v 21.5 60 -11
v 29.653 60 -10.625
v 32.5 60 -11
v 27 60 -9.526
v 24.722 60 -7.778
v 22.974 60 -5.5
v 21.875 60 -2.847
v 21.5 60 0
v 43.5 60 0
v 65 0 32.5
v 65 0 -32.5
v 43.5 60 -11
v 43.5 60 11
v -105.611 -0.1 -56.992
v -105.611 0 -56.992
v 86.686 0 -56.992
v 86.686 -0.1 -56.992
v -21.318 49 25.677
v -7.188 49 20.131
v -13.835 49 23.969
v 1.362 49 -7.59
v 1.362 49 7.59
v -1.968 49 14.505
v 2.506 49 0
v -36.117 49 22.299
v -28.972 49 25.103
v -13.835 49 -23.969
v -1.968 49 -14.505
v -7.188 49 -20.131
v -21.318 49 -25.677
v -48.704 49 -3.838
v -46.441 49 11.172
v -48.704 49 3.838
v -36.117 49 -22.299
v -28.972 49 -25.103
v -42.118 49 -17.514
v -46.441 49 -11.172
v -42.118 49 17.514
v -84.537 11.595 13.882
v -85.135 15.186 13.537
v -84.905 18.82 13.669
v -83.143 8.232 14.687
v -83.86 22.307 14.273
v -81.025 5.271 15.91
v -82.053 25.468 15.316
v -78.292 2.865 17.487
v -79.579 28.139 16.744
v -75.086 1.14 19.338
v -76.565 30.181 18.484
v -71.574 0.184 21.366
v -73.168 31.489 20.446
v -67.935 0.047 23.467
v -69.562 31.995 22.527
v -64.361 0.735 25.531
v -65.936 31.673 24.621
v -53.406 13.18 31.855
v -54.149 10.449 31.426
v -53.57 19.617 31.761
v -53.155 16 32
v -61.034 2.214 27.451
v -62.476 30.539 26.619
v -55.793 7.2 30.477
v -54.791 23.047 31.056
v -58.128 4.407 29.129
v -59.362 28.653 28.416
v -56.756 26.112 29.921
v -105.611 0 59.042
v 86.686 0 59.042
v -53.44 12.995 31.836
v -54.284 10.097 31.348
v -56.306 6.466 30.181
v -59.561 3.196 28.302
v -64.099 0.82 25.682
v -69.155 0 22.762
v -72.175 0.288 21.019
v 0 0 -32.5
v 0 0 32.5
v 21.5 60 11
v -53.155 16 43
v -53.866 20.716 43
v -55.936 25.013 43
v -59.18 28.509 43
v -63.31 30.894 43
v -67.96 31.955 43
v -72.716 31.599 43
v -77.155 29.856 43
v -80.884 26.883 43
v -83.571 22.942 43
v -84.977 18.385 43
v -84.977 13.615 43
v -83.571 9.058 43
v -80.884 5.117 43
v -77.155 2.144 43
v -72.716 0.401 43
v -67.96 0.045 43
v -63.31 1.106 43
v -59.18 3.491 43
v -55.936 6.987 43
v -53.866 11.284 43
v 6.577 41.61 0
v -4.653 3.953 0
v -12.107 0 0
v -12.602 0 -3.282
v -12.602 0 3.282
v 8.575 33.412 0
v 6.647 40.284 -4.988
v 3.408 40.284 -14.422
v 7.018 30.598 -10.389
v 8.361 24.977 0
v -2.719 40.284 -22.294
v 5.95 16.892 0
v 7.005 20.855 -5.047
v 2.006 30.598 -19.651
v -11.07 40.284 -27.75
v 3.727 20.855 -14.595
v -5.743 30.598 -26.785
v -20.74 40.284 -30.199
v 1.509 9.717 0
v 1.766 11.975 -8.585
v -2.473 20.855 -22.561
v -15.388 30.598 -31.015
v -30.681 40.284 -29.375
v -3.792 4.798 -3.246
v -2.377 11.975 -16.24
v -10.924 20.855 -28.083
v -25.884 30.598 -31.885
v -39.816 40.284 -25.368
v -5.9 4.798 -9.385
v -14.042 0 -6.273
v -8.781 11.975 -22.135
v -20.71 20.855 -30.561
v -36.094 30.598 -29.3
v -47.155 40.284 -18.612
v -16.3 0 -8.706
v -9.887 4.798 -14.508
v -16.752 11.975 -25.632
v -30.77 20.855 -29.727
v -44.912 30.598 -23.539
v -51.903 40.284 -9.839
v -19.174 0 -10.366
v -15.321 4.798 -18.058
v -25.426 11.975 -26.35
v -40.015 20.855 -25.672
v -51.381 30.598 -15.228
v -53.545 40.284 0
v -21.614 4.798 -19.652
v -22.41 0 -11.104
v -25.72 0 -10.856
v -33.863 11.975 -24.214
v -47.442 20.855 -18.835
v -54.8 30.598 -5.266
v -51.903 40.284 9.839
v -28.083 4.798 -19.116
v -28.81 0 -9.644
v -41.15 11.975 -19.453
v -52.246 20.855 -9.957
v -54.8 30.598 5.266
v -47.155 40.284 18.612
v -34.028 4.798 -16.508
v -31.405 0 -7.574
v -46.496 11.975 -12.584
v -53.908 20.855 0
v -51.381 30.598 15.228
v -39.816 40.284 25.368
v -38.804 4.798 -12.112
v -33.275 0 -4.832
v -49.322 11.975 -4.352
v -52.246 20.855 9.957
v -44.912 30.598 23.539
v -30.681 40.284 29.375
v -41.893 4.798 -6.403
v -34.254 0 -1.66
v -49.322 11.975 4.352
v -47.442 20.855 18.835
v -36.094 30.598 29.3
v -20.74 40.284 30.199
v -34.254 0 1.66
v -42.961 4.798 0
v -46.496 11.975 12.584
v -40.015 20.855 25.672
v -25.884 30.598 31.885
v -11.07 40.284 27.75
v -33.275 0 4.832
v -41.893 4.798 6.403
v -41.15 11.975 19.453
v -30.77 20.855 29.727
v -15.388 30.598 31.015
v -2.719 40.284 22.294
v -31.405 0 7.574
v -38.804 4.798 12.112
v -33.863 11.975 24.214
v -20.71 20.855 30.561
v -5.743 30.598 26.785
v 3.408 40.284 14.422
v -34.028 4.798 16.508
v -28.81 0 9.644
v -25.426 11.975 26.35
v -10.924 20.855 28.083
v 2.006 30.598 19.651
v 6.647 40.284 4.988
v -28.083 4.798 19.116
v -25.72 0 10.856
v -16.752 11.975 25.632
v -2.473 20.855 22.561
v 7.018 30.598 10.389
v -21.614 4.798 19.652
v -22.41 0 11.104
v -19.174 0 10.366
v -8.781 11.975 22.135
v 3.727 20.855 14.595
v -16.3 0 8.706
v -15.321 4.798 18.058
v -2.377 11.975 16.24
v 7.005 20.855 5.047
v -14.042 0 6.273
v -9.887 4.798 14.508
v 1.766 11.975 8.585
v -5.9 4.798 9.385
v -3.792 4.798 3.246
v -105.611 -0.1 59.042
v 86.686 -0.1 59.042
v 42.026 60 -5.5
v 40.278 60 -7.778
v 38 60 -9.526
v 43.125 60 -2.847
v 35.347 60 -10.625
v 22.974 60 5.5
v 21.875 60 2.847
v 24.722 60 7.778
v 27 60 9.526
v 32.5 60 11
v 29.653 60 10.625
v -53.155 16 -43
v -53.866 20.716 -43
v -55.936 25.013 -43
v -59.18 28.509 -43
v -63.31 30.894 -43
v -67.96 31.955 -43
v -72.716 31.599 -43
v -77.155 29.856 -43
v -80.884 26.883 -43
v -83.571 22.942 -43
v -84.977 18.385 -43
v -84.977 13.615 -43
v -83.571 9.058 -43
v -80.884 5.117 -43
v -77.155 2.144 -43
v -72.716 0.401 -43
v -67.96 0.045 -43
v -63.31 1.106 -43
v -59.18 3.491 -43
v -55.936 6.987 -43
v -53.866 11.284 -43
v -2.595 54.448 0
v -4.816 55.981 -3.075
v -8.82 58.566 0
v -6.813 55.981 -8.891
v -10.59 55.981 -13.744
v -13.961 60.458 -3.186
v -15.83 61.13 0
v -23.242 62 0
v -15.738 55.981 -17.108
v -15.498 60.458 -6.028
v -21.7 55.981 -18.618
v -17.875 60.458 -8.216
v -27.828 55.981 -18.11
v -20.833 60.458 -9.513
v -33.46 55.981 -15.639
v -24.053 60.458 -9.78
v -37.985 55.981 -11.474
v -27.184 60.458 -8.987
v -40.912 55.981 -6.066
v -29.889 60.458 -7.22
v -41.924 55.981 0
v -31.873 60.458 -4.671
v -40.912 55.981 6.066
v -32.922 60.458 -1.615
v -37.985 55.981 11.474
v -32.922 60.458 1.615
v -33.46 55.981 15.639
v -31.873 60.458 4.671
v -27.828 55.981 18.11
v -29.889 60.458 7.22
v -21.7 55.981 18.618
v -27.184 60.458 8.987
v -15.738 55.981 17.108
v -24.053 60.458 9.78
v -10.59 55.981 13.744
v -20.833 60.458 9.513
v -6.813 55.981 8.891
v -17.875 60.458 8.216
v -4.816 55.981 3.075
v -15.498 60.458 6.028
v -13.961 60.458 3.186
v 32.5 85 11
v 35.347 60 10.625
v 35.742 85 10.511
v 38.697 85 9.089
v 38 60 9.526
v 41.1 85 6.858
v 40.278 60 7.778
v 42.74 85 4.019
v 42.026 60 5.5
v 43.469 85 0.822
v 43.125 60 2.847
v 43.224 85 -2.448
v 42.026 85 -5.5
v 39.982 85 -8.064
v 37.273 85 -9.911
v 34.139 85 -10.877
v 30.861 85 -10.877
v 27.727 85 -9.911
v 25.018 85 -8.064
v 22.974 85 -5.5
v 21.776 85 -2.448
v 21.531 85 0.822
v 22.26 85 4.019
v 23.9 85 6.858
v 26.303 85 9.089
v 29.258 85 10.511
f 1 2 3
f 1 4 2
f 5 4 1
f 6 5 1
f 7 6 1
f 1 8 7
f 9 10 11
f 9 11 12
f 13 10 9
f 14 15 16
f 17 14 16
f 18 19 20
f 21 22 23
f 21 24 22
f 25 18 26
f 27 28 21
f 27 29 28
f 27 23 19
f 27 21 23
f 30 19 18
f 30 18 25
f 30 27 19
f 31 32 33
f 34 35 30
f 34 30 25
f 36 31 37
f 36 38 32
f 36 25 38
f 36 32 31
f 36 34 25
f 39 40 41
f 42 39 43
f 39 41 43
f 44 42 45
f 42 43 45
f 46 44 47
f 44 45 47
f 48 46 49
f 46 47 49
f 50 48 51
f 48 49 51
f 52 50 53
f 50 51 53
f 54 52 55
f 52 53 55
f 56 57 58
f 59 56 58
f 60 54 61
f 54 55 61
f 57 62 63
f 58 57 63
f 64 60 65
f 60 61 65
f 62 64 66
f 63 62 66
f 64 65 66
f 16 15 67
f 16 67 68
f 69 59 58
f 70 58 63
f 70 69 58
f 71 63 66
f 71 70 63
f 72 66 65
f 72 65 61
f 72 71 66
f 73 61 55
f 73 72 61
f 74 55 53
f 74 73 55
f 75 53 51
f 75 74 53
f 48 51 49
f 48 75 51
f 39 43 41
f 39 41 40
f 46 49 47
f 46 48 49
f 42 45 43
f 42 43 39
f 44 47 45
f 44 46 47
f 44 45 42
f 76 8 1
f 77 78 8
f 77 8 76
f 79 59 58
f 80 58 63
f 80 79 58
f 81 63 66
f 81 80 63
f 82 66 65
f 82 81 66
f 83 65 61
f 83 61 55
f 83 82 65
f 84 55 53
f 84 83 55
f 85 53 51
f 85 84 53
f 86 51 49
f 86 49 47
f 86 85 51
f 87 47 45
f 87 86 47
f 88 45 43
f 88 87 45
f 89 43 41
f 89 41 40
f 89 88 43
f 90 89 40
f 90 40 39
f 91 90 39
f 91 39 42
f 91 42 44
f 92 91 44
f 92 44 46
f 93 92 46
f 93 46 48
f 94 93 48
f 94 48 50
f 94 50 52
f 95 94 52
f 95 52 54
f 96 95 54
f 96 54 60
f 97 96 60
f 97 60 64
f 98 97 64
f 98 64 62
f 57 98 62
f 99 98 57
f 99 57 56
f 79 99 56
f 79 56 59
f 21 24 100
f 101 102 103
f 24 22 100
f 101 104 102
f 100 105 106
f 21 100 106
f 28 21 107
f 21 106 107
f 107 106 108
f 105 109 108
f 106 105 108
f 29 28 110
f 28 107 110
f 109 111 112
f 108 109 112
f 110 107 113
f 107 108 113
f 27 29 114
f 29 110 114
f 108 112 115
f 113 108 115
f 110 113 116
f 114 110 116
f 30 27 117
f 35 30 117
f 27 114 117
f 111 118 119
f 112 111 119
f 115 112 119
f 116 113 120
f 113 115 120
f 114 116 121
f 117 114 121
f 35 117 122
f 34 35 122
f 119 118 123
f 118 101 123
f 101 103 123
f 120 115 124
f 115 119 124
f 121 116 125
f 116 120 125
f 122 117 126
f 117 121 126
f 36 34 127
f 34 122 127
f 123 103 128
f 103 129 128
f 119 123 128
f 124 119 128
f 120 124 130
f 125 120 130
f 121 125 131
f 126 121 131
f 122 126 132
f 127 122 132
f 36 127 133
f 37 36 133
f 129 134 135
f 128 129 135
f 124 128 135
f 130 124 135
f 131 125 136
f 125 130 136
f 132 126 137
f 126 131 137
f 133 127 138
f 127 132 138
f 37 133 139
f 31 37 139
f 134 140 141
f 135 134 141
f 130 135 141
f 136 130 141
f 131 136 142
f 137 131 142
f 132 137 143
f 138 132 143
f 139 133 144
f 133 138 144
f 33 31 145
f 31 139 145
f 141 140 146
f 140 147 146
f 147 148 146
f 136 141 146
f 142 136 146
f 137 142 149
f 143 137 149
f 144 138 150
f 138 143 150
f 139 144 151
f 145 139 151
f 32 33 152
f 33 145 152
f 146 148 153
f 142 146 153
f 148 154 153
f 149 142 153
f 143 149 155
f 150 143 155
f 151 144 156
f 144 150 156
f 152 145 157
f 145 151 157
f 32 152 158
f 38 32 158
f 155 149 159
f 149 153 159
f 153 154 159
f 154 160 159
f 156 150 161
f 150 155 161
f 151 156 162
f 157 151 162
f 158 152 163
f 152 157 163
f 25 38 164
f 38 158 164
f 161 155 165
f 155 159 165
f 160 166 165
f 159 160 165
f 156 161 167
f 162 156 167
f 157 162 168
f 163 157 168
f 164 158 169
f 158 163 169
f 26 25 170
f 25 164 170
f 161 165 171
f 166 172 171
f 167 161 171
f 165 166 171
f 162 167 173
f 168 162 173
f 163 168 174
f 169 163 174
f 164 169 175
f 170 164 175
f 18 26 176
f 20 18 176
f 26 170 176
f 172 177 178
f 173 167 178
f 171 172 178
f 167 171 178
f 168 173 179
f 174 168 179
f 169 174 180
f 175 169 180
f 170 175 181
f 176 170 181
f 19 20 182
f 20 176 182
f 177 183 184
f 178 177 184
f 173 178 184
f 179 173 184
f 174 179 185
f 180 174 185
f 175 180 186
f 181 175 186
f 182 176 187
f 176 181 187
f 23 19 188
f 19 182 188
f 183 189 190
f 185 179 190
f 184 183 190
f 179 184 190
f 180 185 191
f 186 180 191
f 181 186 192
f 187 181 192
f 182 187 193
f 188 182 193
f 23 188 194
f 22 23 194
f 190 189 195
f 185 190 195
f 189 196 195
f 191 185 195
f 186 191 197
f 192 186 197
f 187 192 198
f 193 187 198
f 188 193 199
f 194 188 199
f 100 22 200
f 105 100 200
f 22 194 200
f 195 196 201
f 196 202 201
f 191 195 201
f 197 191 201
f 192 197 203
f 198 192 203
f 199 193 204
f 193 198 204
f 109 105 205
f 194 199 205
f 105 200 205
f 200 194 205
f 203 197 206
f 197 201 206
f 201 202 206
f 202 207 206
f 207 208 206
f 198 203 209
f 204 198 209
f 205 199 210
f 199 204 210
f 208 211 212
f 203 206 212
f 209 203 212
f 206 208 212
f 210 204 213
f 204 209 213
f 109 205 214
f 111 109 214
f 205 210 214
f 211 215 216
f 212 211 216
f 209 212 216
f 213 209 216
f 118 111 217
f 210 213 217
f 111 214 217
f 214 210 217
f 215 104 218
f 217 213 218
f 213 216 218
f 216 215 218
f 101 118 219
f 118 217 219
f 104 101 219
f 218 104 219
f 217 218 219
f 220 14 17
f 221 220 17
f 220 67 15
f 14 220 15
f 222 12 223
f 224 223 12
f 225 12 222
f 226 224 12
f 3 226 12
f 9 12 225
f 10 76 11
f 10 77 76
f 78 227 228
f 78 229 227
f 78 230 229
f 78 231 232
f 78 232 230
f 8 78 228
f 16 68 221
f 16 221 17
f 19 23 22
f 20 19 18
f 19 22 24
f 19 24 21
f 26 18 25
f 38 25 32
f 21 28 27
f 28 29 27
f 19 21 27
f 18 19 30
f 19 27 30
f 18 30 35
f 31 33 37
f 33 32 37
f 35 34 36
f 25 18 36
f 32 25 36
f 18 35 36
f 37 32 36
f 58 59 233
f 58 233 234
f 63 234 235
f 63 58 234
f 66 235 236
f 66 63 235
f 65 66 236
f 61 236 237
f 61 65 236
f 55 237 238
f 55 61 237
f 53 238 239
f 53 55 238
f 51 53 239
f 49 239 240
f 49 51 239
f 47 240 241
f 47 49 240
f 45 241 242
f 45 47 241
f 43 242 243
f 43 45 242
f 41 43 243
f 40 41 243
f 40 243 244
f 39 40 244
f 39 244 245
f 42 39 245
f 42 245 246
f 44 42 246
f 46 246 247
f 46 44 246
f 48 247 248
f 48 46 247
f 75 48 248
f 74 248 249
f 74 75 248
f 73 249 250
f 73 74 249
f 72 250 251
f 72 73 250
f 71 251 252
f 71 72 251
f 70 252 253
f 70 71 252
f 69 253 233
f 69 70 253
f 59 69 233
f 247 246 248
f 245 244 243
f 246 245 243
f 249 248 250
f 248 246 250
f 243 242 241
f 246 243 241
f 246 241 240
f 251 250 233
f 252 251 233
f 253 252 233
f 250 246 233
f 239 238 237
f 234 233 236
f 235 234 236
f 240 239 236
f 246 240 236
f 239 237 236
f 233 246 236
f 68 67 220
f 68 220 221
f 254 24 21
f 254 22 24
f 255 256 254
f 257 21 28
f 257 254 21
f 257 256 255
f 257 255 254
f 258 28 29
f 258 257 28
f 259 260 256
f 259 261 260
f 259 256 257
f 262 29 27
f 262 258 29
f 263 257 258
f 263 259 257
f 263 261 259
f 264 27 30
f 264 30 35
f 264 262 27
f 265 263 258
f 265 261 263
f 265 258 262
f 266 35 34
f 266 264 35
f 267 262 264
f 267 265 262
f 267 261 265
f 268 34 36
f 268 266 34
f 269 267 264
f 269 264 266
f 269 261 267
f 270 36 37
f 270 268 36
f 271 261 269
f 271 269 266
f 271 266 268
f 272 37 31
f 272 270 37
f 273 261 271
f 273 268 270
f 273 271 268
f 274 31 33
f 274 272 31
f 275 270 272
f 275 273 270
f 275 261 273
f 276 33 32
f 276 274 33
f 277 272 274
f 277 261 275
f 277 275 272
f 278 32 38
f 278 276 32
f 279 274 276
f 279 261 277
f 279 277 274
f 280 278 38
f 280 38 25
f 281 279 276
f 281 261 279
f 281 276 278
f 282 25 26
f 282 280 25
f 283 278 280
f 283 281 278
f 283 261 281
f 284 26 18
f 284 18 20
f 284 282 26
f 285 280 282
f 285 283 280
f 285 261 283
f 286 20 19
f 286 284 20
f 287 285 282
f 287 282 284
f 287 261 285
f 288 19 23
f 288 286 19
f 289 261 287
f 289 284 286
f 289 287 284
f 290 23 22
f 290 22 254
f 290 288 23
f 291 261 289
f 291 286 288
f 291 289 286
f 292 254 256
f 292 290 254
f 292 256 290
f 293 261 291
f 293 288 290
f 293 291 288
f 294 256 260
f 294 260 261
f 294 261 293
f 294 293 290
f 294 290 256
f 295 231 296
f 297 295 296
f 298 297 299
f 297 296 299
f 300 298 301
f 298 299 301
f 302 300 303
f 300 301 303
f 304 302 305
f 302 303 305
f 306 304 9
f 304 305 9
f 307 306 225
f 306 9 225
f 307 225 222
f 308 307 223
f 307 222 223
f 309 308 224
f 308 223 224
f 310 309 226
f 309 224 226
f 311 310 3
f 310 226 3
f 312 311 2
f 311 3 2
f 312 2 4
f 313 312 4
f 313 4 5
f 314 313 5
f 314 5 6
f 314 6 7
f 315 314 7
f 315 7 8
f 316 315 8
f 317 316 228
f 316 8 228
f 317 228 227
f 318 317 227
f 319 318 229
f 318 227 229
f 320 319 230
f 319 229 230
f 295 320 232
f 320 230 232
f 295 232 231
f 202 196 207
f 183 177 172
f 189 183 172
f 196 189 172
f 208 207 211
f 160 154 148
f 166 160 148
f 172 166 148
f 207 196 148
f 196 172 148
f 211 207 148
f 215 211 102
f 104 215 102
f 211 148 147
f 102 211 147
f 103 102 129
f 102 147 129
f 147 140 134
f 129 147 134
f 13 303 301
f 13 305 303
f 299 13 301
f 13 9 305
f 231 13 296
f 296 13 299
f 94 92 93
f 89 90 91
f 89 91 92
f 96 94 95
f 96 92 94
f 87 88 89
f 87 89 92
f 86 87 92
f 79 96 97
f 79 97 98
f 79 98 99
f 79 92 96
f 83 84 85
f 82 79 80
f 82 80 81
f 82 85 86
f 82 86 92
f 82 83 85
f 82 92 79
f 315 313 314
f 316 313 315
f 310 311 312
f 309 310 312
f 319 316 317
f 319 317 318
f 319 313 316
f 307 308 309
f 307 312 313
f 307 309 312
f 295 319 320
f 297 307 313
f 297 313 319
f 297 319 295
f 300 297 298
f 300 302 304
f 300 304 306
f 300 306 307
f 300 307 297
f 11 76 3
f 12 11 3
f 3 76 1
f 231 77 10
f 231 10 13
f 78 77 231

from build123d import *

# Parameters (mm, degrees)
BOSS_EXTRUDE1_DEPTH = 32.5
CUT_EXTRUDE1_DEPTH  = 95.240384125
SKETCH5_R           = 16
BOSS_EXTRUDE2_DEPTH = 43
CUT_EXTRUDE2_DEPTH  = 114.773628326
BOSS_EXTRUDE3_REACH = 137.983
SKETCH7_R           = 16
SKETCH8_R           = 11
BOSS_EXTRUDE4_DEPTH = 25
SKETCH9_W           = 192.296560702
SKETCH9_H           = 116.033958803
BOSS_EXTRUDE5_DEPTH = 0.1


with BuildPart() as part:
    # Sketch1 → Boss-Extrude1 (new, symmetric)
    with BuildSketch(Plane.XY):
        Polygon((0, 0), (65, 0), (43.5, 60), (21.5, 60), align=None)
    extrude(amount=BOSS_EXTRUDE1_DEPTH, both=True)

    # Sketch2 → Cut-Extrude1 (cut, through all)
    with BuildSketch(Plane(origin=(0, 0, 0), x_dir=(0, 0, -1), z_dir=(1, 0, 0))):
        Polygon((11, 60), (32.5, 60), (32.5, 0), align=None)
        Polygon((-32.5, 0), (-11, 60), (-32.5, 60), align=None)
    extrude(amount=CUT_EXTRUDE1_DEPTH, mode=Mode.SUBTRACT)

    # Sketch8 → Boss-Extrude4 (add)
    with BuildSketch(Plane(origin=(0, 60, 0), x_dir=(1, 0, 0), z_dir=(0, 1, 0))):
        with Locations(Location((32.5, 0, 0), (0, 0, 270))):
            Circle(SKETCH8_R)
    extrude(amount=BOSS_EXTRUDE4_DEPTH)


with BuildPart() as body_2:
    # Sketch3 → Revolve1 (revolve)
    with BuildSketch(Plane.XY):
        with BuildLine():
            Line((-12.106888729, 0), (-23.242417455, 0))
            Line((-23.242417455, 0), (-23.242417455, 49))
            Line((-23.242417455, 49), (2.506368924, 49))
            ThreePointArc((2.506368924, 49), (7.422924141, 20.854682903), (-12.106888729, 0))
        make_face()
    revolve(axis=Axis((-23.242417455, 0, 0), (0, 1, 0)))


with BuildPart() as body_3:
    # Sketch4 → Revolve2 (revolve)
    with BuildSketch(Plane.XY):
        with BuildLine():
            Line((-23.242417455, 49), (2.506368924, 49))
            ThreePointArc((2.506368924, 49), (-8.820212353, 58.565713714), (-23.242417455, 62))
            Line((-23.242417455, 62), (-23.242417455, 49))
        make_face()
    revolve(axis=Axis((-23.242417455, 49, 0), (0, 1, 0)))


with BuildPart() as body_4:
    # Sketch5 → Boss-Extrude2 (new, symmetric)
    with BuildSketch(Plane.XY):
        with Locations((-69.155378588, 16)):
            Circle(SKETCH5_R)
    extrude(amount=BOSS_EXTRUDE2_DEPTH, both=True)

    # Sketch6 → Cut-Extrude2 (cut, through all)
    with BuildSketch(Plane(origin=(0, 0, 0), x_dir=(1, 0, 0), z_dir=(0, 1, 0))):
        Polygon((-53.155378588, -32), (-93.662728042, -8.613070889), (-93.662728042, -63.183775795), (-40.15438586, -61.061315458), align=None)
    extrude(amount=CUT_EXTRUDE2_DEPTH, mode=Mode.SUBTRACT)


with BuildPart() as body_5:
    # Boss-Extrude3: up to this plane
    boss_extrude3_end = Plane(origin=(-53.155378588, 62, 32), z_dir=(-0.4999999999999979, 0, 0.8660254037844399))
    # Sketch7 → Boss-Extrude3 (new, up to the surface)
    with BuildSketch(Plane.XY.offset(43), mode=Mode.PRIVATE) as boss_extrude3_sk1:
        with Locations((-69.155378588, 16)):
            Circle(SKETCH7_R)
    boss_extrude3_tool1 = split(extrude(boss_extrude3_sk1.sketch, amount=-BOSS_EXTRUDE3_REACH, mode=Mode.PRIVATE), bisect_by=boss_extrude3_end, keep=Keep.BOTH, mode=Mode.PRIVATE)
    add(boss_extrude3_tool1.solids().sort_by_distance((-69.155379, 16, 43))[0])


with BuildPart() as body_6:
    # Sketch9 → Boss-Extrude5 (new body)
    with BuildSketch(Plane(origin=(0, 0, 0), x_dir=(1, 0, 0), z_dir=(0, 1, 0))):
        with Locations((-9.462668311, -1.025034971)):
            Rectangle(SKETCH9_W, SKETCH9_H)
    extrude(amount=-BOSS_EXTRUDE5_DEPTH)


solid = Compound([part.part, body_2.part, body_3.part, body_4.part, body_5.part, body_6.part])
